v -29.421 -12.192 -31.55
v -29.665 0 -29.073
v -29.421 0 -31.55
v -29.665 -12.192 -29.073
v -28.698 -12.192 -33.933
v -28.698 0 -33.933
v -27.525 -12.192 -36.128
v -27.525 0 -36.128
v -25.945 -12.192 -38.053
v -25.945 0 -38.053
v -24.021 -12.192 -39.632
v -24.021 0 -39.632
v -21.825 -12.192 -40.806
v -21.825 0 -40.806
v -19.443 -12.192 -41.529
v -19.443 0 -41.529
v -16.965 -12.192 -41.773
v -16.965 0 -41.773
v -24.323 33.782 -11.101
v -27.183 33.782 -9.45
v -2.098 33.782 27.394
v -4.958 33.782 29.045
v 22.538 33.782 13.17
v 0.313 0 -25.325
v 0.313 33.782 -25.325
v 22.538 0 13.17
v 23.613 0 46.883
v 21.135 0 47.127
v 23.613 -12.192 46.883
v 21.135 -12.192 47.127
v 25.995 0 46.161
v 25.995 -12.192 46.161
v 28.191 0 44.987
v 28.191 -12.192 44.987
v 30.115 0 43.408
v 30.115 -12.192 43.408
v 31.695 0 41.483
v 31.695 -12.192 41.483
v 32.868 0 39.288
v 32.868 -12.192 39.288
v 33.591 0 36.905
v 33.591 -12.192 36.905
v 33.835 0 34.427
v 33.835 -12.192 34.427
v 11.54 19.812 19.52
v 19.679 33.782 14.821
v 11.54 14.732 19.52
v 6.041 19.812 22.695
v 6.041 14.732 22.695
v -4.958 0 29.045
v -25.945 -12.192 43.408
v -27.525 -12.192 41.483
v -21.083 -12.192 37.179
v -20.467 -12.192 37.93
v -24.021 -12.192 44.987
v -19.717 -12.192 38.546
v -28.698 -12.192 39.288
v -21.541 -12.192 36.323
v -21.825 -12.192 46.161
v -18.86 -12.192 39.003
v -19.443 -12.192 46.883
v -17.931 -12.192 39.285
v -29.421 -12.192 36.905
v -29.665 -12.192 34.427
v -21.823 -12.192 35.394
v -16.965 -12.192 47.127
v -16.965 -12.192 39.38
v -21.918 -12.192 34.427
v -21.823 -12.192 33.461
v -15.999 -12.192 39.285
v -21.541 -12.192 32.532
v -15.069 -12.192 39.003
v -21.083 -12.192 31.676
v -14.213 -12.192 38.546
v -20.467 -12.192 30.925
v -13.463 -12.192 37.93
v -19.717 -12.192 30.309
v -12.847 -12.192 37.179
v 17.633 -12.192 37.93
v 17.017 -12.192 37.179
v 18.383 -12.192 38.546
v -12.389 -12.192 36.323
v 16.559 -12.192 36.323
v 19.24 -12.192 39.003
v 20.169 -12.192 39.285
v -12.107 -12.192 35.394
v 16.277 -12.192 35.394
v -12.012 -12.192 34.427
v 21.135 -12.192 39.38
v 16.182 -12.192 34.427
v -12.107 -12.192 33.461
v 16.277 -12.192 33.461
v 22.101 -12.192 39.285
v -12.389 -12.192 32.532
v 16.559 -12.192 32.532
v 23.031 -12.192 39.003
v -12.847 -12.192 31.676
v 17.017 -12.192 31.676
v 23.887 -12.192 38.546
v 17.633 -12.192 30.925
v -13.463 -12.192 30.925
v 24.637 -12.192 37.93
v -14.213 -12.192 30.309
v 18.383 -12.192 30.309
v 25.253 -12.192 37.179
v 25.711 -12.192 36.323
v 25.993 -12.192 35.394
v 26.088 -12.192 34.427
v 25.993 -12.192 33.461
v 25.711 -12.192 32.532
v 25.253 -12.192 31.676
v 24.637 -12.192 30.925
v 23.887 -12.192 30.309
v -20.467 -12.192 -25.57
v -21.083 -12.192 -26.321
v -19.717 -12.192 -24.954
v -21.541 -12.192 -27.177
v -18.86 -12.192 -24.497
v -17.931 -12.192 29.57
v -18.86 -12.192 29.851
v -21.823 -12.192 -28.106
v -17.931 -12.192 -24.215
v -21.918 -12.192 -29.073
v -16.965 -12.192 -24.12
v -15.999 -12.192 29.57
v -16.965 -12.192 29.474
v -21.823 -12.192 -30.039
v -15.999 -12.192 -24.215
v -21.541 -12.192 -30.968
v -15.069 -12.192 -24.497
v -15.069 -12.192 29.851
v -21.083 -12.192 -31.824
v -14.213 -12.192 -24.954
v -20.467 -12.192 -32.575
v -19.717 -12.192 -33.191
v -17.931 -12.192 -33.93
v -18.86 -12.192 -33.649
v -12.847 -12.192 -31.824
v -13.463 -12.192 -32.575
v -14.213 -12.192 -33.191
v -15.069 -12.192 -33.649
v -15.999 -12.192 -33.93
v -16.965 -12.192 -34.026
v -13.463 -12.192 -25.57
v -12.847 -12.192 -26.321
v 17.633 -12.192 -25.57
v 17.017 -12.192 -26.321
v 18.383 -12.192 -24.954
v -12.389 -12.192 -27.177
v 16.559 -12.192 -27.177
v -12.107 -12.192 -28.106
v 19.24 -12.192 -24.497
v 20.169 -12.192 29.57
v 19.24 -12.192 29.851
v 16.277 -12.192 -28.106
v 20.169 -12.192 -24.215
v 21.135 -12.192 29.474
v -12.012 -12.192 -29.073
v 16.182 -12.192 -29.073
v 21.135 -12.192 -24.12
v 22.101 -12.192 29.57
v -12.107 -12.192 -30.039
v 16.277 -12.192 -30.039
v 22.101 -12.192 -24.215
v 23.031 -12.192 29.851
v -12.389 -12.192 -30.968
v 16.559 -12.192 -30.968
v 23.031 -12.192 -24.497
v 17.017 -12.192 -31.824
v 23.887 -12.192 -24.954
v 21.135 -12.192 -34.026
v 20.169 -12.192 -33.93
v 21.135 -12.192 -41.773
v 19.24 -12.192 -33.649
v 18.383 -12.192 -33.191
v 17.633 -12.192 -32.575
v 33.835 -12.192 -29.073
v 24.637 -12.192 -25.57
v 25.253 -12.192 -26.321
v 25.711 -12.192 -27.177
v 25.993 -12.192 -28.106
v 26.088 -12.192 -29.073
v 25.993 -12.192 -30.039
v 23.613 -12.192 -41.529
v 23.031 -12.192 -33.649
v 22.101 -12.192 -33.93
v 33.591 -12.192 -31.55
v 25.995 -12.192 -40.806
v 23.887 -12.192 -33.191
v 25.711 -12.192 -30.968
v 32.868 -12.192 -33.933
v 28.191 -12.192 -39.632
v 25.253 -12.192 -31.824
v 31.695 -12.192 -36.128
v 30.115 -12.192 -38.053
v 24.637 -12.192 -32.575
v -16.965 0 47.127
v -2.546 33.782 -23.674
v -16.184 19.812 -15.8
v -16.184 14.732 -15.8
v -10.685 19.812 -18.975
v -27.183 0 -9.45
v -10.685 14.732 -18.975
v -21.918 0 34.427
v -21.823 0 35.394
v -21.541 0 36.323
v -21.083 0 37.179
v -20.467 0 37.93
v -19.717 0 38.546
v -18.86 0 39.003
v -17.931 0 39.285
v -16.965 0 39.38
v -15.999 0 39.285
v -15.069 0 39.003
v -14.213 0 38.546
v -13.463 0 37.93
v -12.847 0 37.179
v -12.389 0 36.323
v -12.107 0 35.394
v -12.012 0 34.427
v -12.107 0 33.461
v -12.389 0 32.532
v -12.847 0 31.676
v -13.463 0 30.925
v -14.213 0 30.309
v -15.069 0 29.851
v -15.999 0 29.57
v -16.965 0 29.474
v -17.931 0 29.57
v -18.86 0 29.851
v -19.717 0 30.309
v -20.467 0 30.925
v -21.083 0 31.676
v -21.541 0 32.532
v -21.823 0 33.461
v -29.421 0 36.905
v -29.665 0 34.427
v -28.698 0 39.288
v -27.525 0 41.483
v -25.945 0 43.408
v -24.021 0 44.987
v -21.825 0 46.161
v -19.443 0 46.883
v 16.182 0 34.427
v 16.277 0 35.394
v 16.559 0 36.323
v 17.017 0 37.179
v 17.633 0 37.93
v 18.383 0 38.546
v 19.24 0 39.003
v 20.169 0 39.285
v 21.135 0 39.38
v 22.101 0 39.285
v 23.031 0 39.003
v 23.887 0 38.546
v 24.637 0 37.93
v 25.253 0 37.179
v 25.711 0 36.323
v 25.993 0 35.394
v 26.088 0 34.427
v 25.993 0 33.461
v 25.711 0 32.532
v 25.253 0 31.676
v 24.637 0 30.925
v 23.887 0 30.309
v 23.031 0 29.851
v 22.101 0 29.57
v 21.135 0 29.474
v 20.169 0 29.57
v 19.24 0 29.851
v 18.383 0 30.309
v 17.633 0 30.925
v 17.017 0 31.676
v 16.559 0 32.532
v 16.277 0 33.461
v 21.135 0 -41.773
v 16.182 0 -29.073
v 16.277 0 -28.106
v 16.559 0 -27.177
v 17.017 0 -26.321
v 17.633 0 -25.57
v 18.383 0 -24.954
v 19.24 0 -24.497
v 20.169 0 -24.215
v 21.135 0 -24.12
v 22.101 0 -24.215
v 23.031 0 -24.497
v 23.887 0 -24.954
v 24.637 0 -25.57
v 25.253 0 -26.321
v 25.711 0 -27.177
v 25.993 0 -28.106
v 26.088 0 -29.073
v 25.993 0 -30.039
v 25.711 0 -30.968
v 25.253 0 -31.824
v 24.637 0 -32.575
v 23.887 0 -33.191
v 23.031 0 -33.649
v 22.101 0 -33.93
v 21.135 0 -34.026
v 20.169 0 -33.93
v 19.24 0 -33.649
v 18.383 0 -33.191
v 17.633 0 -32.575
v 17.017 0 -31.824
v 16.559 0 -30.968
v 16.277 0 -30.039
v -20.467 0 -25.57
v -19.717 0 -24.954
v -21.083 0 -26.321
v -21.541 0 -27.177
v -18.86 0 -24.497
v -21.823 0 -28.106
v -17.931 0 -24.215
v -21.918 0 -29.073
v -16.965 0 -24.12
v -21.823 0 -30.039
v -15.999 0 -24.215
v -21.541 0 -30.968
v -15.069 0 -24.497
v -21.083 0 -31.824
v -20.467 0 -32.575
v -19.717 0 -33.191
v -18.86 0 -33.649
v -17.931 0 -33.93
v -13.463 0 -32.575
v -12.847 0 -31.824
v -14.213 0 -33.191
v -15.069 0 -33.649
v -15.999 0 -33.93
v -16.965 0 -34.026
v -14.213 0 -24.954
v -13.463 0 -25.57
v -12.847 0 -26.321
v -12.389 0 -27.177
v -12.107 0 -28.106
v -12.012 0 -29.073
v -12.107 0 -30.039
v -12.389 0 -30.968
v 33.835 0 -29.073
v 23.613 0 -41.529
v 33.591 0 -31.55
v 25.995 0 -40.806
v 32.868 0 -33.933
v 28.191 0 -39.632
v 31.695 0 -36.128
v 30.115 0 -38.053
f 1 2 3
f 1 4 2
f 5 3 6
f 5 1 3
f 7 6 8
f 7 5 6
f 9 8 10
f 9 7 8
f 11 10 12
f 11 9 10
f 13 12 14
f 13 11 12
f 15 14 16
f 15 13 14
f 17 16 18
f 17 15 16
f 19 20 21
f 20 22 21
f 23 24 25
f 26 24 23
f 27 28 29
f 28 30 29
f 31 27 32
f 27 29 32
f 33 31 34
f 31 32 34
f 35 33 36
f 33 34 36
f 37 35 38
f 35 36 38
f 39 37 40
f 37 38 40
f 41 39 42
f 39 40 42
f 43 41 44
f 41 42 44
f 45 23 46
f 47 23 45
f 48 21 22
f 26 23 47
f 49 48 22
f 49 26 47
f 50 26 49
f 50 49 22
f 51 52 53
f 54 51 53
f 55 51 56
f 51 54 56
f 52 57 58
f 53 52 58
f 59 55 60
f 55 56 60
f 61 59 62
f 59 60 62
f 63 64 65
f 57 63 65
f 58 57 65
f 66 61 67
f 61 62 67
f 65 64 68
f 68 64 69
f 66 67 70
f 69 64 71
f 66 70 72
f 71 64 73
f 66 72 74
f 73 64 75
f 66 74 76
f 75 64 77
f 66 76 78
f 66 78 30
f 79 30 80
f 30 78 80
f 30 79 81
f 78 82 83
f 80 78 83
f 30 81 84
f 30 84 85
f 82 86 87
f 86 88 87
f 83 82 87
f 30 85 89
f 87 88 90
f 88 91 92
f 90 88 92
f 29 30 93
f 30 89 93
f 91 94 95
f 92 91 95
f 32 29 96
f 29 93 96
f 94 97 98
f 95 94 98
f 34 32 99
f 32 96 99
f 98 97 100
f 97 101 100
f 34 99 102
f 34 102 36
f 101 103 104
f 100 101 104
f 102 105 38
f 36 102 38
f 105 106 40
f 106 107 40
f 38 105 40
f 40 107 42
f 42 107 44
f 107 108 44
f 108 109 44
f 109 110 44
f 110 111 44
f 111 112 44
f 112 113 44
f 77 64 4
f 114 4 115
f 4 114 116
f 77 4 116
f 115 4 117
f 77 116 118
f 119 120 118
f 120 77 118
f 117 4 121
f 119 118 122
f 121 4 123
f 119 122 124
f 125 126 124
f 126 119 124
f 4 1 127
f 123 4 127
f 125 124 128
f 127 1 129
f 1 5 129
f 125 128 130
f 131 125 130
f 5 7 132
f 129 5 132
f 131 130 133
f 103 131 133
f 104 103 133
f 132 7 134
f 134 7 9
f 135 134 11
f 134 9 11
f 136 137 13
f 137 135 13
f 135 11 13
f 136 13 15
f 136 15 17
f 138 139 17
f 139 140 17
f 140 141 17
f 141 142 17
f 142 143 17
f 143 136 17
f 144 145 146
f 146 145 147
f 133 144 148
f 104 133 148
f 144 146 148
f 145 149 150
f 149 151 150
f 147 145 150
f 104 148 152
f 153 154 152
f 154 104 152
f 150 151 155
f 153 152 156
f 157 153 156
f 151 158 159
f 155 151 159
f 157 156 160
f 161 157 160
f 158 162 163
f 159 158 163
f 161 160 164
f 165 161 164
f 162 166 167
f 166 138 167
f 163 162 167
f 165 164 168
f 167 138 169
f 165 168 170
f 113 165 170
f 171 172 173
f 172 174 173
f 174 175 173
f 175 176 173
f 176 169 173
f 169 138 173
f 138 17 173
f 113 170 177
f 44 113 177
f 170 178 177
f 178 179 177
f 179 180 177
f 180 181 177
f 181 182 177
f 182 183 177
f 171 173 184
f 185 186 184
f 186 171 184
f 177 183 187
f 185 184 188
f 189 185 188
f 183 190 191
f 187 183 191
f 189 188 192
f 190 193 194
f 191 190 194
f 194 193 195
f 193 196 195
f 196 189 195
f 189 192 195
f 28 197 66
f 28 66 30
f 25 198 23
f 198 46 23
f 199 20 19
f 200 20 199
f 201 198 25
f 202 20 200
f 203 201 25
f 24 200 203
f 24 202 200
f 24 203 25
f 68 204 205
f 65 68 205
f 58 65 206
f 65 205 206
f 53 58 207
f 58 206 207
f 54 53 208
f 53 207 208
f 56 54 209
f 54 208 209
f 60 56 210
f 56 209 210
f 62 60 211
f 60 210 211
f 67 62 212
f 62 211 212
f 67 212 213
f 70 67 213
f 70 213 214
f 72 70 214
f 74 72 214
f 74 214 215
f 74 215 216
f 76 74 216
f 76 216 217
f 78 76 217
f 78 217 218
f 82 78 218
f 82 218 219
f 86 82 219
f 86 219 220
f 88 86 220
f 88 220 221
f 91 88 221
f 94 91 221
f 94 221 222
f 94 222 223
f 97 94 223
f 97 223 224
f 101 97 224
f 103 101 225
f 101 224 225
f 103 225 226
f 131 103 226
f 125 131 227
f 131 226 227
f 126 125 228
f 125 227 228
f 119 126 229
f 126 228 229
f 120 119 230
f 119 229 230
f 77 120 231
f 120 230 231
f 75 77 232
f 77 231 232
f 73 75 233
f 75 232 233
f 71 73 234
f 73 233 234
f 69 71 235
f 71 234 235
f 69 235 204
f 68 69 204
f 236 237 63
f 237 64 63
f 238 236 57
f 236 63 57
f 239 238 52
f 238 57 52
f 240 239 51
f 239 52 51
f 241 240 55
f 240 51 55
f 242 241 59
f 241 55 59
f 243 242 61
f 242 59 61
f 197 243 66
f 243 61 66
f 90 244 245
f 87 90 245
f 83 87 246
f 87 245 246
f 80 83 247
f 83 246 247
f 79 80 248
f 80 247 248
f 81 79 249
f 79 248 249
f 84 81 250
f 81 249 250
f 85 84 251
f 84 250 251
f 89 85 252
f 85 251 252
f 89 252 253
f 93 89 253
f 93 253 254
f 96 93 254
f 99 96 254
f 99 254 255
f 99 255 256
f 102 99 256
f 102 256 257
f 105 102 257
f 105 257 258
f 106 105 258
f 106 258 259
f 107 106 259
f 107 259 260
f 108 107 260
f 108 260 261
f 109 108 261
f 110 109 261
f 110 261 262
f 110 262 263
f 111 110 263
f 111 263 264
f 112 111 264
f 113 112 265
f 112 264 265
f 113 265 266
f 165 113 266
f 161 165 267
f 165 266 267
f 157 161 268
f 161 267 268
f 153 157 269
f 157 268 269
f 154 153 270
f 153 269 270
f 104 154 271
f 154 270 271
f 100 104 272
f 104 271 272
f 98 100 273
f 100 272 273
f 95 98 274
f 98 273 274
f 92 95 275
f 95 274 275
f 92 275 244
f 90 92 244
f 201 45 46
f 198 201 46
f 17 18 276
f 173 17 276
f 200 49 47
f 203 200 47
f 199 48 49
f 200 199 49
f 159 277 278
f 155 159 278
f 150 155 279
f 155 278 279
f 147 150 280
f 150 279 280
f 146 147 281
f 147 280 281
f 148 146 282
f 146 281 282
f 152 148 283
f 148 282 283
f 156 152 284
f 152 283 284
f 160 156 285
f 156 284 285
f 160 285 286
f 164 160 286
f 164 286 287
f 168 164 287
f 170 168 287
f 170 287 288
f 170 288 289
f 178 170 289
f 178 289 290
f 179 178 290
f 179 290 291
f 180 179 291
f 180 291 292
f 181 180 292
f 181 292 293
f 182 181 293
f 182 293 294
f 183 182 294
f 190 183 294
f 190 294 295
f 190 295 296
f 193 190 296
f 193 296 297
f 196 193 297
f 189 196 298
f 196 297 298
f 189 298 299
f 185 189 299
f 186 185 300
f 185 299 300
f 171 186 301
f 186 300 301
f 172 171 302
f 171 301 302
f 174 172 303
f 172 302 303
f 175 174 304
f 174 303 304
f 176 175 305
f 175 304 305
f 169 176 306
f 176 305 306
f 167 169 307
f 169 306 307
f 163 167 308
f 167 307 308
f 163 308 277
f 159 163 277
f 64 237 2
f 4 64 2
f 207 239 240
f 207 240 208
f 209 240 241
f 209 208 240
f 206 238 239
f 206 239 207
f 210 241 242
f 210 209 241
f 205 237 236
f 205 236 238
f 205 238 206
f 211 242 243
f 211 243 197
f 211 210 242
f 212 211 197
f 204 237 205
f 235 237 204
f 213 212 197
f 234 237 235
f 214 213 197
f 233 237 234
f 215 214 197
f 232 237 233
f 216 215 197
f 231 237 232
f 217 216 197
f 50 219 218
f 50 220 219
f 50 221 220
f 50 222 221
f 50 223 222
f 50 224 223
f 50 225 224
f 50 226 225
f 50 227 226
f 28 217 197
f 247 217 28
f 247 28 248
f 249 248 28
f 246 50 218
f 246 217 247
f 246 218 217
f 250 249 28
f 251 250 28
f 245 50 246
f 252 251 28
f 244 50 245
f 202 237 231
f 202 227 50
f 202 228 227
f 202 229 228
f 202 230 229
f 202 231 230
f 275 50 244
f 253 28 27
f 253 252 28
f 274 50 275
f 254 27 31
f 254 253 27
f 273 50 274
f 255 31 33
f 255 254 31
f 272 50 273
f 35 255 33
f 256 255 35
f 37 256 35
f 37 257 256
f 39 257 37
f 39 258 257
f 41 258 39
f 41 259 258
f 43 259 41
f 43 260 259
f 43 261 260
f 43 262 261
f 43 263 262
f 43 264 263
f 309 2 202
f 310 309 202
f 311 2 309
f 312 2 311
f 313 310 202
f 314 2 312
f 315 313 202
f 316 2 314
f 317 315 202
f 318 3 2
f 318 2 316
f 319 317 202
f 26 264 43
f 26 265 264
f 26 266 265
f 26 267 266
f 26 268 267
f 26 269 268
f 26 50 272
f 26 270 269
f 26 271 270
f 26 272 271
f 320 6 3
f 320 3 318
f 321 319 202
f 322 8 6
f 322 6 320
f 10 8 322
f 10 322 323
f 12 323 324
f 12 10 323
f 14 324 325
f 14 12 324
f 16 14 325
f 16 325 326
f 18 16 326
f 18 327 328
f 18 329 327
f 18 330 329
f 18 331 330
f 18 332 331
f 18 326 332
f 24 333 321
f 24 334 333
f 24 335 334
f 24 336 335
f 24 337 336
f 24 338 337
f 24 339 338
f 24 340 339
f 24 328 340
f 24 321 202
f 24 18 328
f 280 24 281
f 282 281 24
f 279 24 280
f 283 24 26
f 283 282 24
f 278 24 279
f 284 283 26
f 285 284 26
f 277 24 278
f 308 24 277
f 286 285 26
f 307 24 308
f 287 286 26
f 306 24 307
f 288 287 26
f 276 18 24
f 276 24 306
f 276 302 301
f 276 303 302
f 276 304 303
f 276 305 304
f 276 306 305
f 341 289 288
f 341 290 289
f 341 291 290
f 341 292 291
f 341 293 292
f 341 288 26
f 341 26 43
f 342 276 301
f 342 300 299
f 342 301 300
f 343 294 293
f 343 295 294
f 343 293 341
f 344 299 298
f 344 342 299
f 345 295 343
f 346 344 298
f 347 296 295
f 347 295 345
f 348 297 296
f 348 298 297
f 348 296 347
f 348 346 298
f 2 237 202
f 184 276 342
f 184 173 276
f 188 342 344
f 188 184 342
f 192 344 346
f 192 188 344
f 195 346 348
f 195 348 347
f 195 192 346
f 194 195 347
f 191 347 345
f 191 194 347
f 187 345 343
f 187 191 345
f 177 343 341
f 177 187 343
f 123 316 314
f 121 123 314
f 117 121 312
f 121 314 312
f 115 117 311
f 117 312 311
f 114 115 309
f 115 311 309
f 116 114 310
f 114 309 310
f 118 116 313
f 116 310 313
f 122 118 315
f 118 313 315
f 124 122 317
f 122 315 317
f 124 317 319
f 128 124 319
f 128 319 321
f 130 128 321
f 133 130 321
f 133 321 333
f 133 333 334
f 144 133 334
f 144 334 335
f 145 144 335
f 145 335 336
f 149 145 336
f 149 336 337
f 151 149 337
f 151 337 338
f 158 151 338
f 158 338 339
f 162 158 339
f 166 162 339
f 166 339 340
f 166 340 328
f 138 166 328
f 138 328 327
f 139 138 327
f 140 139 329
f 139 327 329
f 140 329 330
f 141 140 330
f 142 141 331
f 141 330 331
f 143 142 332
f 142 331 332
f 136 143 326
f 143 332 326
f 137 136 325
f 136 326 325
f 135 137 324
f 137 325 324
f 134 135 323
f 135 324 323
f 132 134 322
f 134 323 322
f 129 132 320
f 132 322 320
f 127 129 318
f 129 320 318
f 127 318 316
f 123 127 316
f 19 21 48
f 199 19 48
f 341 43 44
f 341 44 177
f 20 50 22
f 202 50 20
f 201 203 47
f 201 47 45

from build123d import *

# Parameters (mm, degrees)
SKETCH1_W            = 63.5
SKETCH1_H            = 88.9
EXTRUDE1_DEPTH       = 12.192
SKETCH2_R            = 4.953
CUT_EXTRUDE1_DEPTH   = 13.192
LPATTERN1_COUNT      = 2
LPATTERN1_PITCH      = 63.5
LPATTERN1_COUNT_DIR2 = 2
LPATTERN1_PITCH_DIR2 = 38.1
FILLET1_R            = 12.7
EXTRUDE2_DEPTH       = 33.782
CUT_EXTRUDE3_DEPTH   = 74.683081323


with BuildPart() as part:
    # Sketch1 → Extrude1 (new body)
    with BuildSketch(Plane(origin=(0, 0, 0), x_dir=(1, 0, 0), z_dir=(0, 1, 0))):
        with Locations((2.085074627, -2.677425373)):
            Rectangle(SKETCH1_W, SKETCH1_H)
    extrude(amount=-EXTRUDE1_DEPTH)

    # Sketch2 → Cut-Extrude1 (cut, through all)
    with BuildSketch(Plane(origin=(0, 0, 0), x_dir=(-1, 0, 0), z_dir=(0, 1, 0))):
        with Locations((-21.135074627, 34.427425373)):
            Circle(SKETCH2_R)
    cut_extrude1 = extrude(amount=-CUT_EXTRUDE1_DEPTH, mode=Mode.SUBTRACT)

    # LPattern1: Cut-Extrude1 2 × 2
    with Locations(*[(-j * LPATTERN1_PITCH_DIR2, 0, -i * LPATTERN1_PITCH) for i in range(LPATTERN1_COUNT) for j in range(LPATTERN1_COUNT_DIR2) if (i, j) != (0, 0)]):
        add(cut_extrude1, mode=Mode.SUBTRACT)

    # Fillet1
    fillet1_edges = [part.edges().sort_by_distance(p)[0] for p in [
        (-29.664925373, -6.096, -41.772574627),
        (33.835074627, -6.096, -41.772574627),
        (33.835074627, -6.096, 47.127425373),
        (-29.664925373, -6.096, 47.127425373),
    ]]
    fillet(fillet1_edges, radius=FILLET1_R)

    # Sketch4 → Extrude2 (add)
    with BuildSketch(Plane(origin=(0, 0, 0), x_dir=(-1, 0, 0), z_dir=(0, 1, 0))):
        Polygon((-0.31333595, -25.325077129), (-22.53833595, 13.169752069), (4.95797062, 29.044752069), (27.18297062, -9.450077129), align=None)
    extrude(amount=EXTRUDE2_DEPTH)

    # Sketch5 → Cut-Extrude3 (cut, through all)
    with BuildSketch(Plane(origin=(11.337253914, 0, 19.636699798), x_dir=(0.866025404, 0, -0.5), z_dir=(0.5, 0, 0.866025404))):
        Polygon((-110.61611964, 175.14986028), (-15.514104542, 33.782), (-6.116104542, 19.812), (-6.116104542, 14.732), (0.233895458, 14.732), (0.233895458, 19.812), (9.631895458, 33.782), (104.733910555, 175.14986028), (104.733910555, 515.909395413), (-110.61611964, 515.909395413), align=None)
    extrude(amount=-CUT_EXTRUDE3_DEPTH, mode=Mode.SUBTRACT)


solid = part.part
